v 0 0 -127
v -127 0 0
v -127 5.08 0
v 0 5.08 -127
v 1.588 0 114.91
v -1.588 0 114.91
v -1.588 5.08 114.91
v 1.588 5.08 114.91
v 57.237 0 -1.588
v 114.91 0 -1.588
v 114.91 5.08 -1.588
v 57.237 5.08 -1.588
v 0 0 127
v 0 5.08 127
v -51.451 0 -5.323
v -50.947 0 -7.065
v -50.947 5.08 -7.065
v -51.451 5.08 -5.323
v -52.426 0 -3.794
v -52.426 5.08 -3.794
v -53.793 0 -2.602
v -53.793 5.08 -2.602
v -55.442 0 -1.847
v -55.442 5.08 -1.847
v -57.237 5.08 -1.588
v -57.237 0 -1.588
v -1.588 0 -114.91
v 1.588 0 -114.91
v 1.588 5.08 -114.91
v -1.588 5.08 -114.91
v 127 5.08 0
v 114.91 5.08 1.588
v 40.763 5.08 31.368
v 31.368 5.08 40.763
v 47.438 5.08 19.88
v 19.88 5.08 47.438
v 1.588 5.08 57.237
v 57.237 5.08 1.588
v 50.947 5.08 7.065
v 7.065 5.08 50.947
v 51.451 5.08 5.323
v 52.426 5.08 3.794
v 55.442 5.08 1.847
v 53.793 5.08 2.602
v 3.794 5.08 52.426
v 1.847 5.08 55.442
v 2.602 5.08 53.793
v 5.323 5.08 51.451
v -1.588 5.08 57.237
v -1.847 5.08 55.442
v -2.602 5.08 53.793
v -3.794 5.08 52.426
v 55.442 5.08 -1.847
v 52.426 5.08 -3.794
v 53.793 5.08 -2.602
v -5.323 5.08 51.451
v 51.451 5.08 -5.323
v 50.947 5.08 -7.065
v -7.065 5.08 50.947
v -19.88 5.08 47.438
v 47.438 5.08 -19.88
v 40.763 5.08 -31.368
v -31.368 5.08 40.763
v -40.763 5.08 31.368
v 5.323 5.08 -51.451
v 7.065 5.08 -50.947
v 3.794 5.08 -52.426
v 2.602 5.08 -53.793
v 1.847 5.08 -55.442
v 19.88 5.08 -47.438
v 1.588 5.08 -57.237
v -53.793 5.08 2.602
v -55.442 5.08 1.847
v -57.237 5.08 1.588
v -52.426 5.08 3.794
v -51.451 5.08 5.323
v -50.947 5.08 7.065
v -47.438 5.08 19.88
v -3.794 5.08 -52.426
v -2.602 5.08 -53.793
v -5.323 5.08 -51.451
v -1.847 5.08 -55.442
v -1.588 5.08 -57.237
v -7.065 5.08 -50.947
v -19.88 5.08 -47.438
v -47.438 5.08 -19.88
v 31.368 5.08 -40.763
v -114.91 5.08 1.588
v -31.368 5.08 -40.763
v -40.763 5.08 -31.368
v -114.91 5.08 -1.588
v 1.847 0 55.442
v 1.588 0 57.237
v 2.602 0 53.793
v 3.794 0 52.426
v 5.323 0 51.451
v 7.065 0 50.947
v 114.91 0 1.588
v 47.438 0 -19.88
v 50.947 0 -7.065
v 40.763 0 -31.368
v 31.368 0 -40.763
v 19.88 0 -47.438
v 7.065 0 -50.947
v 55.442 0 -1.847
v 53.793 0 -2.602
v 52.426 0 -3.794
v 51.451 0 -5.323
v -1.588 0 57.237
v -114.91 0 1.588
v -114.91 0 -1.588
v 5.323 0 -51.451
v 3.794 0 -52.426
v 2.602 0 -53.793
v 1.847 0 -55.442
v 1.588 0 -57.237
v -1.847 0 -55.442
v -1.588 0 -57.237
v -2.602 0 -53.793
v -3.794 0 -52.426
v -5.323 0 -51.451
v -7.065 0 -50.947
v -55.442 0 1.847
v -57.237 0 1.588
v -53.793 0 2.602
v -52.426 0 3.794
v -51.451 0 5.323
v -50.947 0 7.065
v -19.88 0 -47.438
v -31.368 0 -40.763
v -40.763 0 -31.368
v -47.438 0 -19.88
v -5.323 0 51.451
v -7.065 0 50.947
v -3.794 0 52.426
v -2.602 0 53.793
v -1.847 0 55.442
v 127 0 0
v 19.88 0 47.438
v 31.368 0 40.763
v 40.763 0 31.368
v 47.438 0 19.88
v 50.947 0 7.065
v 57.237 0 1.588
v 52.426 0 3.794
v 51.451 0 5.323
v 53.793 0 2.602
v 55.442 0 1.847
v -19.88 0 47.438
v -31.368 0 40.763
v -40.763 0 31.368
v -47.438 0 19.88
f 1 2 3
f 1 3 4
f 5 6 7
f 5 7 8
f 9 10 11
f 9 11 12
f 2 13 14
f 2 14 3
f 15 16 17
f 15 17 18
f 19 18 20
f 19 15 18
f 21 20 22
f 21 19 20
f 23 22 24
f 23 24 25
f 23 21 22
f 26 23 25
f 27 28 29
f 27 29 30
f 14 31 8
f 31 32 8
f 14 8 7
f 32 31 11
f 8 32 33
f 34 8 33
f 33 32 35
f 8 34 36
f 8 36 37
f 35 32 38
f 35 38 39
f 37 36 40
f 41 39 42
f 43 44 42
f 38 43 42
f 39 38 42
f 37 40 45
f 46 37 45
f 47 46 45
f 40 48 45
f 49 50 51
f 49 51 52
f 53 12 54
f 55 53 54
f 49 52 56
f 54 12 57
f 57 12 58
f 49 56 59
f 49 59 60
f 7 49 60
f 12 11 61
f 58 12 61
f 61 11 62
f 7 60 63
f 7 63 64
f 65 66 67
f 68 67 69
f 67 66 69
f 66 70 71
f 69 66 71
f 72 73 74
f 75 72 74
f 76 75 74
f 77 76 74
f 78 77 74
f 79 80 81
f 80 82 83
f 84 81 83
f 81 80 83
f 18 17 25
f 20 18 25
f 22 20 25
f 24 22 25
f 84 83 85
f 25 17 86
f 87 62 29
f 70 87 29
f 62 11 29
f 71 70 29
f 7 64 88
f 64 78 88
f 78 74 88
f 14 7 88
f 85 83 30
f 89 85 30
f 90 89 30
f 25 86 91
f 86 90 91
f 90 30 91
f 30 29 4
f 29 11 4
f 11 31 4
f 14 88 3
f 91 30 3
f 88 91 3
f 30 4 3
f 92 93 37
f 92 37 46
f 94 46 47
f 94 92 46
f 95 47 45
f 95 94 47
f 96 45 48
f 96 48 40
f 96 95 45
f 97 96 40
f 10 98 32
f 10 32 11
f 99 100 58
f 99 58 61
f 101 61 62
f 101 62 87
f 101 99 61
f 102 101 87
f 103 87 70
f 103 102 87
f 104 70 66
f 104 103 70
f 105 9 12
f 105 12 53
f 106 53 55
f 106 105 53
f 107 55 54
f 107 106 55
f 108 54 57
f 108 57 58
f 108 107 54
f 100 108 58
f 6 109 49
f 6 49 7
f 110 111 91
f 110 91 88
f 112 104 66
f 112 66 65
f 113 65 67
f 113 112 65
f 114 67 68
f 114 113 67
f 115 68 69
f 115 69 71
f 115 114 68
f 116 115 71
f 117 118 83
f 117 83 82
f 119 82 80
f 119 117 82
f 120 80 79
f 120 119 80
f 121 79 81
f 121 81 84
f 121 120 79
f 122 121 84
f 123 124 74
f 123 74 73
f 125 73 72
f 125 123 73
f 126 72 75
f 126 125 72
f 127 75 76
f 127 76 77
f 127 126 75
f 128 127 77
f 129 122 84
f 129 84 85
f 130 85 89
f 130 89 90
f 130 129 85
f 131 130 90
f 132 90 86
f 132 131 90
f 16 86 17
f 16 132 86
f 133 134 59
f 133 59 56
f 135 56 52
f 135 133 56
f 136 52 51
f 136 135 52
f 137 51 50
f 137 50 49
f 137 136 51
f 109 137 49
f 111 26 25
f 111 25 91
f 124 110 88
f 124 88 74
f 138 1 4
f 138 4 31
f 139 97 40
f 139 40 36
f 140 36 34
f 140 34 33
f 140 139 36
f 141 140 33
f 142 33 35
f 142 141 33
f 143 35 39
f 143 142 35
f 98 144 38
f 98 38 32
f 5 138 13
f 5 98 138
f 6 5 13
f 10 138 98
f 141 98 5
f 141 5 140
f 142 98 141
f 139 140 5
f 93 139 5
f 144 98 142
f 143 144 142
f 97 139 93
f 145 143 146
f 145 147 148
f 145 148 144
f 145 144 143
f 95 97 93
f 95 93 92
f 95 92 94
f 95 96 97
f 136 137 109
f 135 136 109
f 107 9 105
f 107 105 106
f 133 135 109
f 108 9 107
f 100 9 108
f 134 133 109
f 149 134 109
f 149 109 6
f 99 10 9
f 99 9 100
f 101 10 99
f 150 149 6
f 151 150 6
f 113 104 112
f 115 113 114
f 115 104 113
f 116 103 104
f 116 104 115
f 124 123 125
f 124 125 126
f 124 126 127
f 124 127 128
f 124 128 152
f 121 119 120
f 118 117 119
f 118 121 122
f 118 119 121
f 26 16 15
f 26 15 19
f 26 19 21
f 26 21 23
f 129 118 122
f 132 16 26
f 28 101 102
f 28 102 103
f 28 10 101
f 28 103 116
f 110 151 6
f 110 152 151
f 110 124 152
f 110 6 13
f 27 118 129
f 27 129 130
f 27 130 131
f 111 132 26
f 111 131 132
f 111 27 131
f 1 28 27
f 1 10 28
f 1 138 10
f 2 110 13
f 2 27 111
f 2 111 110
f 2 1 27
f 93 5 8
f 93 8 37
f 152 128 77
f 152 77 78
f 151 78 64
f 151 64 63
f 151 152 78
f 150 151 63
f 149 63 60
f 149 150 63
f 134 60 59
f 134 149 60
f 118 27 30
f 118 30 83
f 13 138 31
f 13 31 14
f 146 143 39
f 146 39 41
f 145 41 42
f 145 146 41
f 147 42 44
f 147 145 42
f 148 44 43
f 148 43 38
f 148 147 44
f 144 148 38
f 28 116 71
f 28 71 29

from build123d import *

# Parameters (mm, degrees)
BOSS_EXTRUDE1_DEPTH = 5.08


with BuildPart() as part:
    # Sketch1 → Boss-Extrude1 (new body)
    with BuildSketch(Plane(origin=(0, 0, 0), x_dir=(1, 0, 0), z_dir=(0, 1, 0))):
        Polygon((-127, 0), (0, -127), (127, 0), (0, 127), align=None)
        with BuildLine():
            Line((114.910495706, 1.5875), (114.910495706, -1.5875))
            Line((114.910495706, -1.5875), (57.237245905, -1.5875))
            ThreePointArc((57.237245905, -1.5875), (53.066892499, -3.148903914), (50.947438662, -7.065247253))
            ThreePointArc((50.947438662, -7.065247253), (36.37003729, -36.37003729), (7.065247253, -50.947438662))
            ThreePointArc((7.065247253, -50.947438662), (3.148903914, -53.066892499), (1.5875, -57.237245905))
            Line((1.5875, -57.237245905), (1.5875, -114.910495706))
            Line((1.5875, -114.910495706), (-1.5875, -114.910495706))
            Line((-1.5875, -114.910495706), (-1.5875, -57.237245905))
            ThreePointArc((-1.5875, -57.237245905), (-3.148903914, -53.066892499), (-7.065247253, -50.947438662))
            ThreePointArc((-7.065247253, -50.947438662), (-36.37003729, -36.37003729), (-50.947438662, -7.065247253))
            ThreePointArc((-50.947438662, -7.065247253), (-53.066892499, -3.148903914), (-57.237245905, -1.5875))
            Line((-57.237245905, -1.5875), (-114.910495706, -1.5875))
            Line((-114.910495706, -1.5875), (-114.910495706, 1.5875))
            Line((-114.910495706, 1.5875), (-57.237245905, 1.5875))
            ThreePointArc((-57.237245905, 1.5875), (-53.066892499, 3.148903914), (-50.947438662, 7.065247253))
            ThreePointArc((-50.947438662, 7.065247253), (-36.37003729, 36.37003729), (-7.065247253, 50.947438662))
            ThreePointArc((-7.065247253, 50.947438662), (-3.148903914, 53.066892499), (-1.5875, 57.237245905))
            Line((-1.5875, 57.237245905), (-1.5875, 114.910495706))
            Line((-1.5875, 114.910495706), (1.5875, 114.910495706))
            Line((1.5875, 114.910495706), (1.5875, 57.237245905))
            ThreePointArc((1.5875, 57.237245905), (3.148903914, 53.066892499), (7.065247253, 50.947438662))
            ThreePointArc((7.065247253, 50.947438662), (36.37003729, 36.37003729), (50.947438662, 7.065247253))
            ThreePointArc((50.947438662, 7.065247253), (53.066892499, 3.148903914), (57.237245905, 1.5875))
            Line((57.237245905, 1.5875), (114.910495706, 1.5875))
        make_face(mode=Mode.SUBTRACT)
    extrude(amount=BOSS_EXTRUDE1_DEPTH)


solid = part.part
